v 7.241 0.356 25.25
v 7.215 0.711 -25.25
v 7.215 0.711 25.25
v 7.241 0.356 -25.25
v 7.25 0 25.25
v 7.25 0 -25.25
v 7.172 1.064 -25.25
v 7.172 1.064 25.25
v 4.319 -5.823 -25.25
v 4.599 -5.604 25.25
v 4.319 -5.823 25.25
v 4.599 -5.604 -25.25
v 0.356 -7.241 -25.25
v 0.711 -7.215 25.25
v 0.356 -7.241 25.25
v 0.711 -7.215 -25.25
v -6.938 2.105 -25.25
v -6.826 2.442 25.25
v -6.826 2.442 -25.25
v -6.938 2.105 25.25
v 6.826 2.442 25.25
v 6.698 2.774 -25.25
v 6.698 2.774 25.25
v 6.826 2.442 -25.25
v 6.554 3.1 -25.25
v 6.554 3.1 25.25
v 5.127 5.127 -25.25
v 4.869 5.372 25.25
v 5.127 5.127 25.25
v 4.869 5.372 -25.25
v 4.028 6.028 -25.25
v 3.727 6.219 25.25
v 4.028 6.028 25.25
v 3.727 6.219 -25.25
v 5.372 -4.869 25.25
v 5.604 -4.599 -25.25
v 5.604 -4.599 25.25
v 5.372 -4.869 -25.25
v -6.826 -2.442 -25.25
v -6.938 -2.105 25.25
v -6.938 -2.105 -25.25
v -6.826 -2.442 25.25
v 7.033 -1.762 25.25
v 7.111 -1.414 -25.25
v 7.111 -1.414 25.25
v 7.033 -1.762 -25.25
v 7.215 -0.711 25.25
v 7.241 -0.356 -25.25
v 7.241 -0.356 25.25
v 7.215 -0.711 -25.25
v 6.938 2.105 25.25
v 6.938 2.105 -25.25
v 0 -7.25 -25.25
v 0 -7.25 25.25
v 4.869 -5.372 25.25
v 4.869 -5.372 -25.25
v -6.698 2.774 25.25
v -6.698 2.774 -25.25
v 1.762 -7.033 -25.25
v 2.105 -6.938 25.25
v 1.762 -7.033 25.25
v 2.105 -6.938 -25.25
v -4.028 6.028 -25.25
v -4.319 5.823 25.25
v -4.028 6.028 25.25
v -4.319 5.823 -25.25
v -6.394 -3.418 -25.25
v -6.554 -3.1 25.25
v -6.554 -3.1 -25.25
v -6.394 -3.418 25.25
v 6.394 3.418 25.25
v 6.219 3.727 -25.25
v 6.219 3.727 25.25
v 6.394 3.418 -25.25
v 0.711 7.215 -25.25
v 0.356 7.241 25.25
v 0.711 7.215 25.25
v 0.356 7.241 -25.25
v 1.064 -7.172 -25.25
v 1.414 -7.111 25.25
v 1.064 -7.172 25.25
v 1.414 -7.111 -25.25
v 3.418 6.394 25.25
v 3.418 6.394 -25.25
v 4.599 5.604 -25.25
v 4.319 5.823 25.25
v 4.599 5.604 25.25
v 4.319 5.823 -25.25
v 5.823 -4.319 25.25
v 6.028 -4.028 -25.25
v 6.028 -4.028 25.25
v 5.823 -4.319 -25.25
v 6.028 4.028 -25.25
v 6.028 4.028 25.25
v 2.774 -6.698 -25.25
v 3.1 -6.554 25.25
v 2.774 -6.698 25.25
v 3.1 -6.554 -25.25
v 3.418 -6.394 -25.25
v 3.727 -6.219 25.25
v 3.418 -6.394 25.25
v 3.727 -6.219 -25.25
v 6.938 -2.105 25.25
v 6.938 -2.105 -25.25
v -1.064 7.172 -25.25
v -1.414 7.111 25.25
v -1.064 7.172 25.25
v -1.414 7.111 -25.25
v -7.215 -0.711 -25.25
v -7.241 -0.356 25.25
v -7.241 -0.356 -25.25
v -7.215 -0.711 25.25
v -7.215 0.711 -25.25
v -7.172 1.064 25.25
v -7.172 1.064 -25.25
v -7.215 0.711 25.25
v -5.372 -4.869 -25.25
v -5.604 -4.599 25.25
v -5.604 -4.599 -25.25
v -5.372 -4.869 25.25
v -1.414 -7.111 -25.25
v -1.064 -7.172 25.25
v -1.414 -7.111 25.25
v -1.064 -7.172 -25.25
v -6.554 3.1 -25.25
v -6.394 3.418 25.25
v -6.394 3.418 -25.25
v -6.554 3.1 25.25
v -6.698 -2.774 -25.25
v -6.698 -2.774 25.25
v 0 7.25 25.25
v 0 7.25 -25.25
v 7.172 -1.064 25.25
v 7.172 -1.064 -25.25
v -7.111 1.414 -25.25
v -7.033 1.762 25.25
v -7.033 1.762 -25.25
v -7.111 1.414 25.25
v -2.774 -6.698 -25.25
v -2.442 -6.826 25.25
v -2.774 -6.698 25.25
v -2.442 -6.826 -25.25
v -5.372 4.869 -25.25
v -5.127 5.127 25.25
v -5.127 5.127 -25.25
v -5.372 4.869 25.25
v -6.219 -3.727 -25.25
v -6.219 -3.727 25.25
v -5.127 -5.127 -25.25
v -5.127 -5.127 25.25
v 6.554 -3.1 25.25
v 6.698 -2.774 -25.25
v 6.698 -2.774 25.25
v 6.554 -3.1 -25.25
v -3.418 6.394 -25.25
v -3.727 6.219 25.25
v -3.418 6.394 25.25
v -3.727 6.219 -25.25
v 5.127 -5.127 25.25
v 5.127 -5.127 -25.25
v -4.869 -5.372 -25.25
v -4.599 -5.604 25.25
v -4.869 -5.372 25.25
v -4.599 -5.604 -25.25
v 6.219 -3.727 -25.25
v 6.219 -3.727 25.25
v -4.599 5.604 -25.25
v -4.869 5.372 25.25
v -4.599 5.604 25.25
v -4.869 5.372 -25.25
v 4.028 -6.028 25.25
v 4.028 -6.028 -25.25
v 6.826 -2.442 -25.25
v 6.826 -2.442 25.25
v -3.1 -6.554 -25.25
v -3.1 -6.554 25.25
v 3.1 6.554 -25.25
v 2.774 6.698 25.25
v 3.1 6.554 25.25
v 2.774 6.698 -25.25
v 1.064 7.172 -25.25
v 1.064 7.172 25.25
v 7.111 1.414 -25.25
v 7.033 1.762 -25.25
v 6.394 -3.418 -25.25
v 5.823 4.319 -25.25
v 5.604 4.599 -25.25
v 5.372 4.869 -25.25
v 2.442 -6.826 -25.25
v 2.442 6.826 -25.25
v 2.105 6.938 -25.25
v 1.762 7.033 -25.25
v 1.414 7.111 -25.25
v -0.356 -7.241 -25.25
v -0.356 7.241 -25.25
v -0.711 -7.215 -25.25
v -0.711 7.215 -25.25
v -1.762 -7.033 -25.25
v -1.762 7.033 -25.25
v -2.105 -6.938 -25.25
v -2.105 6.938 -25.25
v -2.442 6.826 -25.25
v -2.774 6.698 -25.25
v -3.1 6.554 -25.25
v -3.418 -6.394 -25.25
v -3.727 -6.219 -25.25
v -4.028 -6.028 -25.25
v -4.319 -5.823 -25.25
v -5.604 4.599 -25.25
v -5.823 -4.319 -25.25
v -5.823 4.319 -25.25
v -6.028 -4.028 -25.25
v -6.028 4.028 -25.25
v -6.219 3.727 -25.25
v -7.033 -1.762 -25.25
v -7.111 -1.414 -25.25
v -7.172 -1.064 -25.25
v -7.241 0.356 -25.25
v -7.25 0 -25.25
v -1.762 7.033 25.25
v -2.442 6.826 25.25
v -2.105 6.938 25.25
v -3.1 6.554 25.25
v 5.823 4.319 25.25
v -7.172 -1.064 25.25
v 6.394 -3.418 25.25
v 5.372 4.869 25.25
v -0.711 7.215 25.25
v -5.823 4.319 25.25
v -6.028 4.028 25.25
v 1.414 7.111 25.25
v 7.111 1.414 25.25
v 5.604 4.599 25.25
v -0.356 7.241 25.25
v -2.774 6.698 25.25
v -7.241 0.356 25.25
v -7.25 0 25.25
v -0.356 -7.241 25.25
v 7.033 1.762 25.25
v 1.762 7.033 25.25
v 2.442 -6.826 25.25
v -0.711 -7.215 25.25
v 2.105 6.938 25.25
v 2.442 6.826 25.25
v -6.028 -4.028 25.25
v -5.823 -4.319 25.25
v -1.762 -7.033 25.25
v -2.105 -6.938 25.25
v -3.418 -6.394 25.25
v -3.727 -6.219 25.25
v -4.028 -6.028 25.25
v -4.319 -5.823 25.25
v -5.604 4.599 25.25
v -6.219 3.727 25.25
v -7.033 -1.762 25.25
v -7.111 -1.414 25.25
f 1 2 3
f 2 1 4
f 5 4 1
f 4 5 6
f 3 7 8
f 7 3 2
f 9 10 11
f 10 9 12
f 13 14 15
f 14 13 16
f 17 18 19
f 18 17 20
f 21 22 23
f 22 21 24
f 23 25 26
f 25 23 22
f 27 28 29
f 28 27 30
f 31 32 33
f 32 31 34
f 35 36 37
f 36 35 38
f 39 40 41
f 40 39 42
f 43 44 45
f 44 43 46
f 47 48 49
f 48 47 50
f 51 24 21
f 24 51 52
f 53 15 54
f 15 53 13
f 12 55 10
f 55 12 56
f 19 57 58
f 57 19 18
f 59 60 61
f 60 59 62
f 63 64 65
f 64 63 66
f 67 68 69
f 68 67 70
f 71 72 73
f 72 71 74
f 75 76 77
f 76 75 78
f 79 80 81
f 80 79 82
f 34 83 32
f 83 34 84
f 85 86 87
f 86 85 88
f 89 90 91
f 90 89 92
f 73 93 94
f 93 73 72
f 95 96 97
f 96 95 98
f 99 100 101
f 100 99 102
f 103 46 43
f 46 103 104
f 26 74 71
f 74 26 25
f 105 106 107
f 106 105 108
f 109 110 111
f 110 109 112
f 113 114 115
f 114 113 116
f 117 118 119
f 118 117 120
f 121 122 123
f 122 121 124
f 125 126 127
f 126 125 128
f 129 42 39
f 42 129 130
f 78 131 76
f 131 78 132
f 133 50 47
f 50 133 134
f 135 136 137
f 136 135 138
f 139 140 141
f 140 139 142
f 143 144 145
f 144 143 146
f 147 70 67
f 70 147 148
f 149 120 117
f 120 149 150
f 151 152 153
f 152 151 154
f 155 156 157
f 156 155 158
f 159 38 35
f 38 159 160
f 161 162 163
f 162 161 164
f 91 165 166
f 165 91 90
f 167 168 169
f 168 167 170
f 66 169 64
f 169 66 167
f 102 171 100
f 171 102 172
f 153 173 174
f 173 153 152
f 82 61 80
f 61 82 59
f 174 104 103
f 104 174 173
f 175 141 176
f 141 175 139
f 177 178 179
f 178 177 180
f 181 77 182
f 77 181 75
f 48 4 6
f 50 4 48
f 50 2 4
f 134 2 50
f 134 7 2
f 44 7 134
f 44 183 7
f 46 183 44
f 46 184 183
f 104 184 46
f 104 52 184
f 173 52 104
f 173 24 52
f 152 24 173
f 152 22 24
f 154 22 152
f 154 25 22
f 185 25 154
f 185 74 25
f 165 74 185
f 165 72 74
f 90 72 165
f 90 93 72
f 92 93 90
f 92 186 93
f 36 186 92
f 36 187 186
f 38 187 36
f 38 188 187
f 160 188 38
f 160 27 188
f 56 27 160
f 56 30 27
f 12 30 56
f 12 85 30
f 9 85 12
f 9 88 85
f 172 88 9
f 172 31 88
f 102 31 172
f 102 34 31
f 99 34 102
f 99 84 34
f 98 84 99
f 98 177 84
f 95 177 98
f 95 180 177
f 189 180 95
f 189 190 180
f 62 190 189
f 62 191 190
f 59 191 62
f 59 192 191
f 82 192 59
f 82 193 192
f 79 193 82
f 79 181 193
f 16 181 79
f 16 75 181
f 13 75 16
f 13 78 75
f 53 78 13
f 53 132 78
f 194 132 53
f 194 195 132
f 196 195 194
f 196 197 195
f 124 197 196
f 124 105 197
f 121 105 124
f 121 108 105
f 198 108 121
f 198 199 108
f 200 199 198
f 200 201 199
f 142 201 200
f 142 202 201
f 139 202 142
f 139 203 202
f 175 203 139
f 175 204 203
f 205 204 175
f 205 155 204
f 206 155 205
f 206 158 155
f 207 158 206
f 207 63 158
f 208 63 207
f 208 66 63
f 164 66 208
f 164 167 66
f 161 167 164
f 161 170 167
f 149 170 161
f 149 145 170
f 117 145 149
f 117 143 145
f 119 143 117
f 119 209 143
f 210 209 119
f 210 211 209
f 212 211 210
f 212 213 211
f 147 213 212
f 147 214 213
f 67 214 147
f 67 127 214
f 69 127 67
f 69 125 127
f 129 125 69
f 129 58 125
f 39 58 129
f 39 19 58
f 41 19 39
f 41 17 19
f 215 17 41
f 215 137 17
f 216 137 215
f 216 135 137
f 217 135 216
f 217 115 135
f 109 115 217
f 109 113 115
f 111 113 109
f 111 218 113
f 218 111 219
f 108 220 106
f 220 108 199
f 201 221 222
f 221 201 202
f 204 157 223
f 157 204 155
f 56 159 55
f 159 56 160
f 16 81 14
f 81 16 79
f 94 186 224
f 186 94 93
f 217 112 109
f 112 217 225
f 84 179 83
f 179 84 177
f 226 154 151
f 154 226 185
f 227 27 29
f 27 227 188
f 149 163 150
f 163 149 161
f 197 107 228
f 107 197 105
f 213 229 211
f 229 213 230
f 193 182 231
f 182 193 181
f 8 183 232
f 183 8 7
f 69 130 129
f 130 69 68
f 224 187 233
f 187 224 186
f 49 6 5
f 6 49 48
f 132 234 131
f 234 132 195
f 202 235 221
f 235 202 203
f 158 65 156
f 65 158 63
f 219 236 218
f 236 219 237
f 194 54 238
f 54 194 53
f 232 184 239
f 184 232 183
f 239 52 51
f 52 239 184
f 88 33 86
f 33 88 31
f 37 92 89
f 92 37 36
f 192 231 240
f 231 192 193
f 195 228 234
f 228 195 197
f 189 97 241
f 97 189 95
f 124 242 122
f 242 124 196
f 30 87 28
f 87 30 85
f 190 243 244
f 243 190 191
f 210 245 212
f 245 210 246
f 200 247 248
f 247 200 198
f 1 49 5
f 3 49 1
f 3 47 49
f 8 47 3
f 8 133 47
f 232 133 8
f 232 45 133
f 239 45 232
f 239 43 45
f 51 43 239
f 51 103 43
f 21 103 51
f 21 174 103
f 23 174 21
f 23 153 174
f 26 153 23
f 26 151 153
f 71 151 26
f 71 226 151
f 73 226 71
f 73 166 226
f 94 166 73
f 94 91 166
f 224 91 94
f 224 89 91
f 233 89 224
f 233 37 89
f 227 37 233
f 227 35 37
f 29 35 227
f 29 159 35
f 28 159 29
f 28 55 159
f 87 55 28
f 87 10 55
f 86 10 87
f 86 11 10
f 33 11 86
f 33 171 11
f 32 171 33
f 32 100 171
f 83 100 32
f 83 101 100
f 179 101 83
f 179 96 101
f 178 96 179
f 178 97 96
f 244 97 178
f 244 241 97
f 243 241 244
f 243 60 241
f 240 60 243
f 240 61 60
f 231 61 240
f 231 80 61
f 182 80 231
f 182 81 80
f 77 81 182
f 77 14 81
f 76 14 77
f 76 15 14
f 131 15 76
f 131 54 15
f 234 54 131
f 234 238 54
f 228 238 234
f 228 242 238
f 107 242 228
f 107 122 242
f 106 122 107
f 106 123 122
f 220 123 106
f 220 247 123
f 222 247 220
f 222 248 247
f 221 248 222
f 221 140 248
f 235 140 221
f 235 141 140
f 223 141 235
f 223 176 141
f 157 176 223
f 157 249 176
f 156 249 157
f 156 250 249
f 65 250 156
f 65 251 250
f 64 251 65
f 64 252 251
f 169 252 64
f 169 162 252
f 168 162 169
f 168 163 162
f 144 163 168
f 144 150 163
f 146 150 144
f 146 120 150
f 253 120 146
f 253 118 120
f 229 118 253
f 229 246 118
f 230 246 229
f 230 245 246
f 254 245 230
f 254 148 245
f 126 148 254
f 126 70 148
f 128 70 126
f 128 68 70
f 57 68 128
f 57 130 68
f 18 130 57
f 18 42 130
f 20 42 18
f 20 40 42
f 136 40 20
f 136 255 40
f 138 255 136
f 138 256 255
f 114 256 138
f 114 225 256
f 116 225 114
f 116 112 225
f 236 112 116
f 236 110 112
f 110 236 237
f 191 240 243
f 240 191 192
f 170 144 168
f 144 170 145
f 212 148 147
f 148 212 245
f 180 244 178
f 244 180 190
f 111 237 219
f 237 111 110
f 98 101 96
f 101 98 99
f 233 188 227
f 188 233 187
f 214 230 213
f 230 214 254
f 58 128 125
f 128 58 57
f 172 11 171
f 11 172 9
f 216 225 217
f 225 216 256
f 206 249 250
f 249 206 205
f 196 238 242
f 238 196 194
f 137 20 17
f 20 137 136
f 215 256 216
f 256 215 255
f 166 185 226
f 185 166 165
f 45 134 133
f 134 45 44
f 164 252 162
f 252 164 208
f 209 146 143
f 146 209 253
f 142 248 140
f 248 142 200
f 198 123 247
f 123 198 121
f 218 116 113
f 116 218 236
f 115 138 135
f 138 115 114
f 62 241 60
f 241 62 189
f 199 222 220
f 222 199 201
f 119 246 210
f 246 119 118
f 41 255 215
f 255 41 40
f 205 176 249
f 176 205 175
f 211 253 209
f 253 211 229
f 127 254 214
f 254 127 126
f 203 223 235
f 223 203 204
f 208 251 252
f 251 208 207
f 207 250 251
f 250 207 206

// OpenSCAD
$fn=128;

cell_h = 50.5;
cell_d = 14.5;

cap_h = 1.2;
cap_d = 5.5;

ring_h = 0.6;
ring_d = 8.0;

module battery_cell(h=cell_h, d=cell_d) {
    union() {
        translate([0,0,-h/2])
            cylinder(h=h, d=d);

        translate([0,0,h/2 - cap_h])
            cylinder(h=cap_h, d=cap_d);

        translate([0,0,h/2 - ring_h])
            difference() {
                cylinder(h=ring_h, d=ring_d);
                translate([0,0,-0.01])
                    cylinder(h=ring_h+0.02, d=cap_d+0.6);
            }
    }
}

battery_cell();
